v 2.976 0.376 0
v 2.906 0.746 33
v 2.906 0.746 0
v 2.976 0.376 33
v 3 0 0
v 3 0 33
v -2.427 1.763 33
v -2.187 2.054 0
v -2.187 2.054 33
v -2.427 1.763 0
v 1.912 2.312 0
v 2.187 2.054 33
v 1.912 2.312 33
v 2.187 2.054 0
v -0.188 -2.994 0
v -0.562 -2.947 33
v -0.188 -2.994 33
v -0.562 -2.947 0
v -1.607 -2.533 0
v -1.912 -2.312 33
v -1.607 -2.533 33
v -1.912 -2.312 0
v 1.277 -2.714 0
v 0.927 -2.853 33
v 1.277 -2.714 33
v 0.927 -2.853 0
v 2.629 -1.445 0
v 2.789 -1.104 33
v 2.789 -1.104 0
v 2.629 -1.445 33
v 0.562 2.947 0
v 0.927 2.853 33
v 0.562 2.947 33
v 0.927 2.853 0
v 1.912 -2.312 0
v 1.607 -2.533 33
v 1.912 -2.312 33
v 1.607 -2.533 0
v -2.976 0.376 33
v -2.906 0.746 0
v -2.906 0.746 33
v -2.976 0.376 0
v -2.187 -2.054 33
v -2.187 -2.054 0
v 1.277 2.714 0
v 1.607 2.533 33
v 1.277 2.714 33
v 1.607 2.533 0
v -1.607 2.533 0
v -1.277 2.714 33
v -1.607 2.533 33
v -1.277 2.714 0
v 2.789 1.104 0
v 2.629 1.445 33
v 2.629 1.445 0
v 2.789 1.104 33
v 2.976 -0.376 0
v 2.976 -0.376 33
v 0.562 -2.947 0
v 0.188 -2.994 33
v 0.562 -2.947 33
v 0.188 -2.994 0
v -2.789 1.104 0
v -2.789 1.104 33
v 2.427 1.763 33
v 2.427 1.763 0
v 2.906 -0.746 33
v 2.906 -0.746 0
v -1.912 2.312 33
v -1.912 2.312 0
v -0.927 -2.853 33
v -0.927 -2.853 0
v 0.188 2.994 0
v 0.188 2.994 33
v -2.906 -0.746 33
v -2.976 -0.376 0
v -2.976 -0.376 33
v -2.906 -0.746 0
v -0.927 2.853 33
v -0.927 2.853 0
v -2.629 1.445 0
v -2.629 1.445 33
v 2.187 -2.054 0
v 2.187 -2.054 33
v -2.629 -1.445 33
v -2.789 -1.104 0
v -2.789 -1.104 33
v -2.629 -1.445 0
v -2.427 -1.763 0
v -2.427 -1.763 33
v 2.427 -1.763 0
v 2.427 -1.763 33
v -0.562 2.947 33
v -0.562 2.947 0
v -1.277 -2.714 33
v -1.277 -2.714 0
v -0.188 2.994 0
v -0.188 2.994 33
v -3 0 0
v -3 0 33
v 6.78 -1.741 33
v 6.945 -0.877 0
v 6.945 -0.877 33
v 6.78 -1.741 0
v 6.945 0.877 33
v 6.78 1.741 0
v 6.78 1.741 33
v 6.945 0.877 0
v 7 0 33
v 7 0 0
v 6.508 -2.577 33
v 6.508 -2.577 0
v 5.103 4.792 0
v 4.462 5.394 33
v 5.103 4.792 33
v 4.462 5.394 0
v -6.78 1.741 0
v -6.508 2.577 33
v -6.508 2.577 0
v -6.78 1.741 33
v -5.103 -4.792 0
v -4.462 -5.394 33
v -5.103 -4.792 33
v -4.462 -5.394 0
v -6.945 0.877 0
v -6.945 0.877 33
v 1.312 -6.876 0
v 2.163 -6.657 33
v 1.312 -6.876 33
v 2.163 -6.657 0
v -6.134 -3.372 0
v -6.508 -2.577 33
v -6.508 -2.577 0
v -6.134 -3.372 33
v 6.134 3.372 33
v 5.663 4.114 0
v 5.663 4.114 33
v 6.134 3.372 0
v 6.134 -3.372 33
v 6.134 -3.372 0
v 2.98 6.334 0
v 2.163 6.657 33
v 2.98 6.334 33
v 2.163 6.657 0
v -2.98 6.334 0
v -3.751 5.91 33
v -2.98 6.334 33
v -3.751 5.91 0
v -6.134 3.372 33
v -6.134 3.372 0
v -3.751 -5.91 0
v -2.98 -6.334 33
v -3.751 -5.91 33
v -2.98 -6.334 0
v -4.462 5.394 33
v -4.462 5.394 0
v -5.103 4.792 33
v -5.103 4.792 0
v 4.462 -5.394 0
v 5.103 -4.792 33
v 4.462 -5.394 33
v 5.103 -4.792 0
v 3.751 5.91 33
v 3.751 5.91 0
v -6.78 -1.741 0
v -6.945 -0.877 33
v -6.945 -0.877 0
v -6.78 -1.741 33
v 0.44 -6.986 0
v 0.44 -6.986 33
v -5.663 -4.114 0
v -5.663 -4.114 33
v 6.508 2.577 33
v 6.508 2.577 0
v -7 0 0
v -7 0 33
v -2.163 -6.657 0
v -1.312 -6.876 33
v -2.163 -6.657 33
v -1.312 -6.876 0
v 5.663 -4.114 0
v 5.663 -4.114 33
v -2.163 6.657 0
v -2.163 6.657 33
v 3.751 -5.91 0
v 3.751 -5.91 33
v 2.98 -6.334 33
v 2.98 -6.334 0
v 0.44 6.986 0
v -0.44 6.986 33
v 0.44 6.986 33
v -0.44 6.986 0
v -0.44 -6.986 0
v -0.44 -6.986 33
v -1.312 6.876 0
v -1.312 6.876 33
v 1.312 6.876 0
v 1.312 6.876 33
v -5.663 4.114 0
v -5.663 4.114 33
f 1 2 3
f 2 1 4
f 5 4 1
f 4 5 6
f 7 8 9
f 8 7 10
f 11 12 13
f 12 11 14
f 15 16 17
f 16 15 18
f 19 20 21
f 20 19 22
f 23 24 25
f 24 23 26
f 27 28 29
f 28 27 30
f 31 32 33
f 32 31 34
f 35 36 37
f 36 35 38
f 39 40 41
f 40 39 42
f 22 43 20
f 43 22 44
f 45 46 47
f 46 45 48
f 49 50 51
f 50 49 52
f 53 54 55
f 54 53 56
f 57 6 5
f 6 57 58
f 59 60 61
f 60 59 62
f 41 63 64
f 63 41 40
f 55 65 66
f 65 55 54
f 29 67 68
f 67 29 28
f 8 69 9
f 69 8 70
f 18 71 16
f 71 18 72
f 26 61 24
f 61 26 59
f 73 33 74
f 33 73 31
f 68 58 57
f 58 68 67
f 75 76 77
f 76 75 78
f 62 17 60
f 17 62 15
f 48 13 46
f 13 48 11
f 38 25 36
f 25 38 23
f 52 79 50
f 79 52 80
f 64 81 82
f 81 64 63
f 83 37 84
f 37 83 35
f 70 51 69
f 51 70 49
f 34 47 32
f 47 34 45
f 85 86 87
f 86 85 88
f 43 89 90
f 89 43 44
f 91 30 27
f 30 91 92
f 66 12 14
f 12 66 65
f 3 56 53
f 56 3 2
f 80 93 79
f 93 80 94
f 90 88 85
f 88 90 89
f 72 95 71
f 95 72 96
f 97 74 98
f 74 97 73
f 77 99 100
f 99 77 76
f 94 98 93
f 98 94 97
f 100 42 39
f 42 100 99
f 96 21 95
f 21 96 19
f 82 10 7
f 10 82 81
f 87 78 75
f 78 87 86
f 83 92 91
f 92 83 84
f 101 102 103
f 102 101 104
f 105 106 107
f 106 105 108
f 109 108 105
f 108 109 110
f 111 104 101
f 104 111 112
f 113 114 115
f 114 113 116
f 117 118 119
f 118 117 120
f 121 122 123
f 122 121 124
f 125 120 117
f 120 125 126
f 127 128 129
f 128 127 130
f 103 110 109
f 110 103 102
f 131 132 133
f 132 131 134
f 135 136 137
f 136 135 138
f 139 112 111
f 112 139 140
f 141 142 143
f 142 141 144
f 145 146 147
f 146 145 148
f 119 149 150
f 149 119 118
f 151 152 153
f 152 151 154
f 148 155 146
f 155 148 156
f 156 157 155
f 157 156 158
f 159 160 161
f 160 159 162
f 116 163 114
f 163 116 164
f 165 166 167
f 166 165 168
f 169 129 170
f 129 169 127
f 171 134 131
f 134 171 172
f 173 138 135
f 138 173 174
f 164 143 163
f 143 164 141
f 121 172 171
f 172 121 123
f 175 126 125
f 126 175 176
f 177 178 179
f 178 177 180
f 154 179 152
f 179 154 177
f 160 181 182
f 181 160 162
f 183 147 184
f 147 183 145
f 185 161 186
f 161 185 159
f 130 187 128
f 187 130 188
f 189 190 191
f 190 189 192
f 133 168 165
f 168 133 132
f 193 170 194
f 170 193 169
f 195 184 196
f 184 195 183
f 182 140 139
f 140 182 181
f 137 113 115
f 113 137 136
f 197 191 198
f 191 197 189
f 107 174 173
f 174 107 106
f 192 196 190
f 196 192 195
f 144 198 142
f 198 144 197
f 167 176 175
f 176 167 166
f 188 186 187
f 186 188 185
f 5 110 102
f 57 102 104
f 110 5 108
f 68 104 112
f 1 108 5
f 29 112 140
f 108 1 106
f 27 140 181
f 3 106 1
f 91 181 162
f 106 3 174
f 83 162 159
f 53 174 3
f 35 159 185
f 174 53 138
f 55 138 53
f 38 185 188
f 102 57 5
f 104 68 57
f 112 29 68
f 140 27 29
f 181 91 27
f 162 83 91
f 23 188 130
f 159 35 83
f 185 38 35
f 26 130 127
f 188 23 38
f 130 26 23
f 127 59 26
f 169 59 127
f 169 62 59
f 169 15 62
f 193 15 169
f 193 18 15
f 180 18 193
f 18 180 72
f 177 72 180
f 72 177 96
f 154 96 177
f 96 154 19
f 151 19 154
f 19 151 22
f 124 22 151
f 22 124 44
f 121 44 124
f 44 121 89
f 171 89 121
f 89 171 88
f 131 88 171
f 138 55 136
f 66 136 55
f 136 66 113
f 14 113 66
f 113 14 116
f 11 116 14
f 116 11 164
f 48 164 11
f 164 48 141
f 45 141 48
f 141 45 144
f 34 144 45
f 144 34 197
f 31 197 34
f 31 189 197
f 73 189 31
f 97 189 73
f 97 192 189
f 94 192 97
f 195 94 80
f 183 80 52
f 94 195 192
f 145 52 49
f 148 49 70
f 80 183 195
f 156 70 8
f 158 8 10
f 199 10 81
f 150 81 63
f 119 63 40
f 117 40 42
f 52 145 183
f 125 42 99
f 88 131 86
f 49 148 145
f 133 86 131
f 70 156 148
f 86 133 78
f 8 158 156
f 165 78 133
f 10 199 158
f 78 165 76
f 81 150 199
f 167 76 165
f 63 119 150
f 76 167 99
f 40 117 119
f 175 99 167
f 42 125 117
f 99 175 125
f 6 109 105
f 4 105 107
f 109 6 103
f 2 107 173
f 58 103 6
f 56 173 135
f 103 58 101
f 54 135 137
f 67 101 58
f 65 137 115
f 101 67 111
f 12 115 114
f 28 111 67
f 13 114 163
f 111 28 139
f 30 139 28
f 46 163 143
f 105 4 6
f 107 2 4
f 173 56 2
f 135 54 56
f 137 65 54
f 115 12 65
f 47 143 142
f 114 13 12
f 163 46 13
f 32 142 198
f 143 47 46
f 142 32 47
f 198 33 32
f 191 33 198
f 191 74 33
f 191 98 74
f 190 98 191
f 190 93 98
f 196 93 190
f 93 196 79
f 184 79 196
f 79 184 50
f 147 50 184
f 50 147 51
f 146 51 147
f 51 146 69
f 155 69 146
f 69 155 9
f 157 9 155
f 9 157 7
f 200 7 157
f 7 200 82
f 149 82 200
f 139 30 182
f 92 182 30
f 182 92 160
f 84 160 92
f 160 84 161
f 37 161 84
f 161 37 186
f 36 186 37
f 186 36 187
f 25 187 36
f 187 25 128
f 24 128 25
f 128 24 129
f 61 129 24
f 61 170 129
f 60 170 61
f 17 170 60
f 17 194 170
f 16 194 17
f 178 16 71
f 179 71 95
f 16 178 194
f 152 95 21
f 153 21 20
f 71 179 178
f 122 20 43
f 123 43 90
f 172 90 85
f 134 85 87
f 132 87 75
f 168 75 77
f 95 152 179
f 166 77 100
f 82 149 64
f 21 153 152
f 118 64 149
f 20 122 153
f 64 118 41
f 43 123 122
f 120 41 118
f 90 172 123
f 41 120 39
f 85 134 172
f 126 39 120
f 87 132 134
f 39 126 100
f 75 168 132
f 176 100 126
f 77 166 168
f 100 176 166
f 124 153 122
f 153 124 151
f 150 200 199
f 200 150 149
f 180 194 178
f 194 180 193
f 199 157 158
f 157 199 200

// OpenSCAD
$fn = 50;


difference() {
	union() {
		cylinder(h = 33, r = 7.0000000000);
	}
	union() {
		translate(v = [0.0000000000, 0.0000000000, -100.0000000000]) {
			cylinder(h = 200, r = 3.0000000000);
		}
		cylinder(h = 33, r = 1.5000000000);
		cylinder(h = 33, r = 1.5000000000);
		cylinder(h = 33, r = 1.5000000000);
	}
}
